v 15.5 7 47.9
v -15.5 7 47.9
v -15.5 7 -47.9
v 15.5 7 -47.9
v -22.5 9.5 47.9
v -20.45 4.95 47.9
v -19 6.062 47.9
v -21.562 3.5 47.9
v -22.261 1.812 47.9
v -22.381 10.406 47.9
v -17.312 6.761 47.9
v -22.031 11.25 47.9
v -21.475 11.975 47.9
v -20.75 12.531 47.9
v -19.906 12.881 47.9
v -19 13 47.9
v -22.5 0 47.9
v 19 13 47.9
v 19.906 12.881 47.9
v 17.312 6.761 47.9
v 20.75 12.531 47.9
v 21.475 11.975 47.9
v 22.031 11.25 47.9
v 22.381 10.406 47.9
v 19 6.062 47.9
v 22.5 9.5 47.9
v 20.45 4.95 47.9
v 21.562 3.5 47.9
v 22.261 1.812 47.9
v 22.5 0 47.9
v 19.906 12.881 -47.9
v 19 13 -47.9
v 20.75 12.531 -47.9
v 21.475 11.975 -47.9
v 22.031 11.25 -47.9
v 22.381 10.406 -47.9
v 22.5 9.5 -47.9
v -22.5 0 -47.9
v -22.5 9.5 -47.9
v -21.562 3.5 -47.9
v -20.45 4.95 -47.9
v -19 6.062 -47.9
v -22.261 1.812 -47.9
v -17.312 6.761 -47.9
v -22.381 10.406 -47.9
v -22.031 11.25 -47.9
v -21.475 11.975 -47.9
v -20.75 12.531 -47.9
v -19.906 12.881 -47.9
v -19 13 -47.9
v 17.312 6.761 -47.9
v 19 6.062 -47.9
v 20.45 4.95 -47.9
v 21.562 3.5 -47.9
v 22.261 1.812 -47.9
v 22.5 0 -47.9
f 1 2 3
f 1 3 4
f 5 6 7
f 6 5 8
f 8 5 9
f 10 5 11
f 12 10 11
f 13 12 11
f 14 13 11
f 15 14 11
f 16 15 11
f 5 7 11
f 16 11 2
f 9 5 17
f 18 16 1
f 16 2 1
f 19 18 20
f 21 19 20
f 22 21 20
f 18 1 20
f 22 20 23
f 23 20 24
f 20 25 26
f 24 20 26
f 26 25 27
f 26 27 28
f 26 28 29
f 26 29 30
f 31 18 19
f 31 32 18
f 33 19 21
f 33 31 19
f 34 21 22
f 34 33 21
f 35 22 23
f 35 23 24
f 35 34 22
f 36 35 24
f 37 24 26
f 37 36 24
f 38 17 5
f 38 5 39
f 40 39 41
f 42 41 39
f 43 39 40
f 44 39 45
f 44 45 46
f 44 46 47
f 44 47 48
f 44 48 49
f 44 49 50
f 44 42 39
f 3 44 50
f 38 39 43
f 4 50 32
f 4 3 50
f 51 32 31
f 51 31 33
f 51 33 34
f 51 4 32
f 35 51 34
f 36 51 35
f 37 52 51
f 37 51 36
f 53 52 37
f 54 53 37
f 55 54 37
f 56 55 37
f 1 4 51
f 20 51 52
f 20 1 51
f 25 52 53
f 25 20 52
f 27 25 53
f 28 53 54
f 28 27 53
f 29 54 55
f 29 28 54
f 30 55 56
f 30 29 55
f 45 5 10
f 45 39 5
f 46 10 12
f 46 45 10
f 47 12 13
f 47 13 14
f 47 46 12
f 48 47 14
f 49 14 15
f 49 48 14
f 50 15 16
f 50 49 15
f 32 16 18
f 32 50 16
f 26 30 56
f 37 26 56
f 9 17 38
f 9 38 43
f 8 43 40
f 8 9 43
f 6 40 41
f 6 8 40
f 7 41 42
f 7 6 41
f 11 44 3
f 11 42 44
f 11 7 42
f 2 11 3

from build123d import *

# Parameters (mm, degrees)
SKETCH1_W           = 45
SKETCH1_H           = 95.8
BOSS_EXTRUDE1_DEPTH = 13
CUT_EXTRUDE1_DEPTH  = 96.8
FILLET2_R           = 3.5


with BuildPart() as part:
    # Sketch1 → Boss-Extrude1 (new body)
    with BuildSketch(Plane(origin=(0, 0, 0), x_dir=(1, 0, 0), z_dir=(0, 1, 0))):
        Rectangle(SKETCH1_W, SKETCH1_H)
    extrude(amount=BOSS_EXTRUDE1_DEPTH)

    # Sketch15 → Cut-Extrude1 (cut, through all)
    with BuildSketch(Plane.XY.offset(47.9)):
        with BuildLine():
            Line((-15.5, 7), (15.5, 7))
            ThreePointArc((15.5, 7), (20.449747468, 4.949747468), (22.5, 0))
            Line((22.5, 0), (-22.5, 0))
            ThreePointArc((-22.5, 0), (-20.449747468, 4.949747468), (-15.5, 7))
        make_face()
    extrude(amount=-CUT_EXTRUDE1_DEPTH, mode=Mode.SUBTRACT)

    # Fillet2
    fillet2_edges = [part.edges().sort_by_distance(p)[0] for p in [
        (22.5, 13, 0),
        (-22.5, 13, 0),
    ]]
    fillet(fillet2_edges, radius=FILLET2_R)


solid = part.part
